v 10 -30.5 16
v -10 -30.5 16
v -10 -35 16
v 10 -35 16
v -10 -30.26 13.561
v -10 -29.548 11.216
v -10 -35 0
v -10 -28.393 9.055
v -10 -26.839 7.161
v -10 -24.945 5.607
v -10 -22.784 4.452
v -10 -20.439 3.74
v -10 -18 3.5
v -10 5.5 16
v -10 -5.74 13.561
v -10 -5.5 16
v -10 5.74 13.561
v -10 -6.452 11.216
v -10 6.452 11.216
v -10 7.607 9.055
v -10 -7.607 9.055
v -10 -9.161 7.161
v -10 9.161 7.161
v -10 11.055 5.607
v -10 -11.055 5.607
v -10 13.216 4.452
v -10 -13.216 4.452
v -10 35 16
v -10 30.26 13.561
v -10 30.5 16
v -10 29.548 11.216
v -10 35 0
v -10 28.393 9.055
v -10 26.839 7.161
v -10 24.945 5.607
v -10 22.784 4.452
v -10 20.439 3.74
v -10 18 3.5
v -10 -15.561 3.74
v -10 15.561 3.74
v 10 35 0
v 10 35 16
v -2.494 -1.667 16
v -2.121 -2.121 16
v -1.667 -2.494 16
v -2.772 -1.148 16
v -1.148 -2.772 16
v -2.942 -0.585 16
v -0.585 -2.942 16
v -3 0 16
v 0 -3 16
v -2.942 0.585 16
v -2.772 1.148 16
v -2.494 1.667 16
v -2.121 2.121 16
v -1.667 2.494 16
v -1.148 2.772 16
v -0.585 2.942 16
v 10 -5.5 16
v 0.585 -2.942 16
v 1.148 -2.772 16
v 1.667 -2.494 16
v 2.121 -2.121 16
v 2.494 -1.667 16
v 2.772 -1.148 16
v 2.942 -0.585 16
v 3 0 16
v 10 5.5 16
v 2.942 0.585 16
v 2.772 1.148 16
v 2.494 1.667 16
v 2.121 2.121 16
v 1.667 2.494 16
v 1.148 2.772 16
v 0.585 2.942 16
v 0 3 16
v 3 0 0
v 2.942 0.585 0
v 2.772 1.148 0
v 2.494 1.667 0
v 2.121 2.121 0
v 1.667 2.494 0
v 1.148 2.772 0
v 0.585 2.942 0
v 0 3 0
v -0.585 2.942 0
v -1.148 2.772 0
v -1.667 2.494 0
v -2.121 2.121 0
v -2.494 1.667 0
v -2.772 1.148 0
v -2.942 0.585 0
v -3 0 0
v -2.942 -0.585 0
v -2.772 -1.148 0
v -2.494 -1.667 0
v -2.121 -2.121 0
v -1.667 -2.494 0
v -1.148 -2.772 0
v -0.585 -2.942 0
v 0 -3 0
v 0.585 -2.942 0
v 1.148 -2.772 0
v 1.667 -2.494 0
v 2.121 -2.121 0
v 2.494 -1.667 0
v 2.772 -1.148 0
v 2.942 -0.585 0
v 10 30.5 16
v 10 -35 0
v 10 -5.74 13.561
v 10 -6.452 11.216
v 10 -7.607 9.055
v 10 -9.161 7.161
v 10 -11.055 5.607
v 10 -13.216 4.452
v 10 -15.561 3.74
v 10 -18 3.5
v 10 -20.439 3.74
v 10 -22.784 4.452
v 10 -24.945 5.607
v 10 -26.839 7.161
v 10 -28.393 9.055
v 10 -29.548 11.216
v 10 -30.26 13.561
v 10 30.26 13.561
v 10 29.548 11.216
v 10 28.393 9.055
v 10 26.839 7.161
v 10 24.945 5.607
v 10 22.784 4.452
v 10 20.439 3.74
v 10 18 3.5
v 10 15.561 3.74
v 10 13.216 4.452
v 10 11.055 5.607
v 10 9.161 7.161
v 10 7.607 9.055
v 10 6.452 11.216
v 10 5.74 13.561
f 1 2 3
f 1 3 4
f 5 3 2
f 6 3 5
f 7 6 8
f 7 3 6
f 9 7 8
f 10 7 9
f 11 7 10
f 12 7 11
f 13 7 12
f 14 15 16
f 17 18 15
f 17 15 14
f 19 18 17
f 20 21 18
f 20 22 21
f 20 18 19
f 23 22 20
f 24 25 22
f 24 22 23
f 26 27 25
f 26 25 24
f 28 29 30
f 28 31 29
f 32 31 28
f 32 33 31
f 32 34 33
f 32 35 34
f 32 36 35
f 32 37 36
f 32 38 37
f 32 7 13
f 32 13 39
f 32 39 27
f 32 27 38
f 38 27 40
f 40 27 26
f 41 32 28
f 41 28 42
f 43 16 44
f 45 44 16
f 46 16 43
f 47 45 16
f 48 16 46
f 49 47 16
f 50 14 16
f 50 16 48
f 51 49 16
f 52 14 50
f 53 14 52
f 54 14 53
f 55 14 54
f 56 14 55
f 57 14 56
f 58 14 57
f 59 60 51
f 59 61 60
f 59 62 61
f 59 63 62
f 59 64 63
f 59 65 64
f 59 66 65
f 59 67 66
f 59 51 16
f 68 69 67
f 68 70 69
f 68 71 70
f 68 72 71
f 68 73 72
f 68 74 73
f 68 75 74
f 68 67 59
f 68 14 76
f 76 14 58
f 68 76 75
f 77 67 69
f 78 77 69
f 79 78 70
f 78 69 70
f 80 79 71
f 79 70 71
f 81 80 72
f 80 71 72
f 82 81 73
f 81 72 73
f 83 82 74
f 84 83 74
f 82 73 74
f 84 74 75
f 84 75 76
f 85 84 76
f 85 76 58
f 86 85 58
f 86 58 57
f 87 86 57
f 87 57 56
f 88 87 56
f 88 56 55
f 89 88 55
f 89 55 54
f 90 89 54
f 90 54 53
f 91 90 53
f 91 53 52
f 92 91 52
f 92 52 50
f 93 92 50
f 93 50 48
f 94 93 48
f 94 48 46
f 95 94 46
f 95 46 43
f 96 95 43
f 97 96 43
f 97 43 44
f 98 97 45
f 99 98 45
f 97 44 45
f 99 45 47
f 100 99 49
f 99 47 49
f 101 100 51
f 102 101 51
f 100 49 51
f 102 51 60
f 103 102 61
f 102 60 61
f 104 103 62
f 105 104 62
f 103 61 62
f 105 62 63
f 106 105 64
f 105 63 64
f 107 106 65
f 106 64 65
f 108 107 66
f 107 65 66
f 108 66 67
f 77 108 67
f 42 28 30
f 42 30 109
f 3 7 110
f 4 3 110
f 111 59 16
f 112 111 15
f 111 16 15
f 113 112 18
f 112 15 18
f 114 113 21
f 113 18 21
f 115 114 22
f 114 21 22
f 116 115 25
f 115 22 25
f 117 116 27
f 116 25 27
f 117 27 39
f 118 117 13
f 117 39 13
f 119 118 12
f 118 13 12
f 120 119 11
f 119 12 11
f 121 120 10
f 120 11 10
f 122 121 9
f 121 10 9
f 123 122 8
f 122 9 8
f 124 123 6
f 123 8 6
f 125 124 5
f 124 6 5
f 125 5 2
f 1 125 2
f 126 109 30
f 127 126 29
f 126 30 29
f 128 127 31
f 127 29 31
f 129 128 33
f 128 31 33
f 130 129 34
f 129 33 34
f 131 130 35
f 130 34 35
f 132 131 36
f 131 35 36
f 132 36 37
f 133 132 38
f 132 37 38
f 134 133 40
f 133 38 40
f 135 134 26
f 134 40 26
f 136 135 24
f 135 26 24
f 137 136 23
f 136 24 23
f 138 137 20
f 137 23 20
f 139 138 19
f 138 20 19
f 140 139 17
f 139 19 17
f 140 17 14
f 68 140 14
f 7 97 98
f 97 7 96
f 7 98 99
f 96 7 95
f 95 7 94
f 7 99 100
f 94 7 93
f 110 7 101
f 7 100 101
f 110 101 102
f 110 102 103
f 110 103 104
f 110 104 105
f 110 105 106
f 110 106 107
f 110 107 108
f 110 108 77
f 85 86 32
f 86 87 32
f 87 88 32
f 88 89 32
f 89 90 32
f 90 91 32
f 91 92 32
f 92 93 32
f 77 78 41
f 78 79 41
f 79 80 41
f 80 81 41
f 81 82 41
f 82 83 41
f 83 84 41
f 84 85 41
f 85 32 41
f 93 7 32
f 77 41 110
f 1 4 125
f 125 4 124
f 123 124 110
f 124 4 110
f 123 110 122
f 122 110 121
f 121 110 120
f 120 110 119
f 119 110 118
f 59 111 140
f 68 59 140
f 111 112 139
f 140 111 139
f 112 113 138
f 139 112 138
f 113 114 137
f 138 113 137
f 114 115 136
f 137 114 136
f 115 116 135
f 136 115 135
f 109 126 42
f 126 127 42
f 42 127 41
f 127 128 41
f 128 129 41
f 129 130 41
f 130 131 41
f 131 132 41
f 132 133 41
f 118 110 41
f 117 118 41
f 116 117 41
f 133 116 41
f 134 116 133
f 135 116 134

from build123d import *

# Parameters (mm, degrees)
SZKIC1_W                    = 20
SZKIC1_H                    = 70
DODANIE_WYCI_GNI_CIE1_DEPTH = 16
SZKIC2_R                    = 12.5
WYTNIJ_WYCI_GNI_CIE1_DEPTH  = 44.370496884
SZKIC3_R                    = 3
WYTNIJ_WYCI_GNI_CIE2_DEPTH  = 40.761790704


with BuildPart() as part:
    # Szkic1 → Dodanie-wyciągnięcie1 (new body)
    with BuildSketch(Plane.XY):
        Rectangle(SZKIC1_W, SZKIC1_H)
    extrude(amount=DODANIE_WYCI_GNI_CIE1_DEPTH)

    # Szkic2 → Wytnij-wyciągnięcie1 (cut, through all)
    with BuildSketch(Plane.ZY.offset(10)):
        with Locations((16, 18)):
            Circle(SZKIC2_R)
        with Locations((16, -18)):
            Circle(SZKIC2_R)
    extrude(amount=-WYTNIJ_WYCI_GNI_CIE1_DEPTH, mode=Mode.SUBTRACT)

    # Szkic3 → Wytnij-wyciągnięcie2 (cut, through all)
    with BuildSketch(Plane.XY.offset(16)):
        Circle(SZKIC3_R)
    extrude(amount=-WYTNIJ_WYCI_GNI_CIE2_DEPTH, mode=Mode.SUBTRACT)


solid = part.part
